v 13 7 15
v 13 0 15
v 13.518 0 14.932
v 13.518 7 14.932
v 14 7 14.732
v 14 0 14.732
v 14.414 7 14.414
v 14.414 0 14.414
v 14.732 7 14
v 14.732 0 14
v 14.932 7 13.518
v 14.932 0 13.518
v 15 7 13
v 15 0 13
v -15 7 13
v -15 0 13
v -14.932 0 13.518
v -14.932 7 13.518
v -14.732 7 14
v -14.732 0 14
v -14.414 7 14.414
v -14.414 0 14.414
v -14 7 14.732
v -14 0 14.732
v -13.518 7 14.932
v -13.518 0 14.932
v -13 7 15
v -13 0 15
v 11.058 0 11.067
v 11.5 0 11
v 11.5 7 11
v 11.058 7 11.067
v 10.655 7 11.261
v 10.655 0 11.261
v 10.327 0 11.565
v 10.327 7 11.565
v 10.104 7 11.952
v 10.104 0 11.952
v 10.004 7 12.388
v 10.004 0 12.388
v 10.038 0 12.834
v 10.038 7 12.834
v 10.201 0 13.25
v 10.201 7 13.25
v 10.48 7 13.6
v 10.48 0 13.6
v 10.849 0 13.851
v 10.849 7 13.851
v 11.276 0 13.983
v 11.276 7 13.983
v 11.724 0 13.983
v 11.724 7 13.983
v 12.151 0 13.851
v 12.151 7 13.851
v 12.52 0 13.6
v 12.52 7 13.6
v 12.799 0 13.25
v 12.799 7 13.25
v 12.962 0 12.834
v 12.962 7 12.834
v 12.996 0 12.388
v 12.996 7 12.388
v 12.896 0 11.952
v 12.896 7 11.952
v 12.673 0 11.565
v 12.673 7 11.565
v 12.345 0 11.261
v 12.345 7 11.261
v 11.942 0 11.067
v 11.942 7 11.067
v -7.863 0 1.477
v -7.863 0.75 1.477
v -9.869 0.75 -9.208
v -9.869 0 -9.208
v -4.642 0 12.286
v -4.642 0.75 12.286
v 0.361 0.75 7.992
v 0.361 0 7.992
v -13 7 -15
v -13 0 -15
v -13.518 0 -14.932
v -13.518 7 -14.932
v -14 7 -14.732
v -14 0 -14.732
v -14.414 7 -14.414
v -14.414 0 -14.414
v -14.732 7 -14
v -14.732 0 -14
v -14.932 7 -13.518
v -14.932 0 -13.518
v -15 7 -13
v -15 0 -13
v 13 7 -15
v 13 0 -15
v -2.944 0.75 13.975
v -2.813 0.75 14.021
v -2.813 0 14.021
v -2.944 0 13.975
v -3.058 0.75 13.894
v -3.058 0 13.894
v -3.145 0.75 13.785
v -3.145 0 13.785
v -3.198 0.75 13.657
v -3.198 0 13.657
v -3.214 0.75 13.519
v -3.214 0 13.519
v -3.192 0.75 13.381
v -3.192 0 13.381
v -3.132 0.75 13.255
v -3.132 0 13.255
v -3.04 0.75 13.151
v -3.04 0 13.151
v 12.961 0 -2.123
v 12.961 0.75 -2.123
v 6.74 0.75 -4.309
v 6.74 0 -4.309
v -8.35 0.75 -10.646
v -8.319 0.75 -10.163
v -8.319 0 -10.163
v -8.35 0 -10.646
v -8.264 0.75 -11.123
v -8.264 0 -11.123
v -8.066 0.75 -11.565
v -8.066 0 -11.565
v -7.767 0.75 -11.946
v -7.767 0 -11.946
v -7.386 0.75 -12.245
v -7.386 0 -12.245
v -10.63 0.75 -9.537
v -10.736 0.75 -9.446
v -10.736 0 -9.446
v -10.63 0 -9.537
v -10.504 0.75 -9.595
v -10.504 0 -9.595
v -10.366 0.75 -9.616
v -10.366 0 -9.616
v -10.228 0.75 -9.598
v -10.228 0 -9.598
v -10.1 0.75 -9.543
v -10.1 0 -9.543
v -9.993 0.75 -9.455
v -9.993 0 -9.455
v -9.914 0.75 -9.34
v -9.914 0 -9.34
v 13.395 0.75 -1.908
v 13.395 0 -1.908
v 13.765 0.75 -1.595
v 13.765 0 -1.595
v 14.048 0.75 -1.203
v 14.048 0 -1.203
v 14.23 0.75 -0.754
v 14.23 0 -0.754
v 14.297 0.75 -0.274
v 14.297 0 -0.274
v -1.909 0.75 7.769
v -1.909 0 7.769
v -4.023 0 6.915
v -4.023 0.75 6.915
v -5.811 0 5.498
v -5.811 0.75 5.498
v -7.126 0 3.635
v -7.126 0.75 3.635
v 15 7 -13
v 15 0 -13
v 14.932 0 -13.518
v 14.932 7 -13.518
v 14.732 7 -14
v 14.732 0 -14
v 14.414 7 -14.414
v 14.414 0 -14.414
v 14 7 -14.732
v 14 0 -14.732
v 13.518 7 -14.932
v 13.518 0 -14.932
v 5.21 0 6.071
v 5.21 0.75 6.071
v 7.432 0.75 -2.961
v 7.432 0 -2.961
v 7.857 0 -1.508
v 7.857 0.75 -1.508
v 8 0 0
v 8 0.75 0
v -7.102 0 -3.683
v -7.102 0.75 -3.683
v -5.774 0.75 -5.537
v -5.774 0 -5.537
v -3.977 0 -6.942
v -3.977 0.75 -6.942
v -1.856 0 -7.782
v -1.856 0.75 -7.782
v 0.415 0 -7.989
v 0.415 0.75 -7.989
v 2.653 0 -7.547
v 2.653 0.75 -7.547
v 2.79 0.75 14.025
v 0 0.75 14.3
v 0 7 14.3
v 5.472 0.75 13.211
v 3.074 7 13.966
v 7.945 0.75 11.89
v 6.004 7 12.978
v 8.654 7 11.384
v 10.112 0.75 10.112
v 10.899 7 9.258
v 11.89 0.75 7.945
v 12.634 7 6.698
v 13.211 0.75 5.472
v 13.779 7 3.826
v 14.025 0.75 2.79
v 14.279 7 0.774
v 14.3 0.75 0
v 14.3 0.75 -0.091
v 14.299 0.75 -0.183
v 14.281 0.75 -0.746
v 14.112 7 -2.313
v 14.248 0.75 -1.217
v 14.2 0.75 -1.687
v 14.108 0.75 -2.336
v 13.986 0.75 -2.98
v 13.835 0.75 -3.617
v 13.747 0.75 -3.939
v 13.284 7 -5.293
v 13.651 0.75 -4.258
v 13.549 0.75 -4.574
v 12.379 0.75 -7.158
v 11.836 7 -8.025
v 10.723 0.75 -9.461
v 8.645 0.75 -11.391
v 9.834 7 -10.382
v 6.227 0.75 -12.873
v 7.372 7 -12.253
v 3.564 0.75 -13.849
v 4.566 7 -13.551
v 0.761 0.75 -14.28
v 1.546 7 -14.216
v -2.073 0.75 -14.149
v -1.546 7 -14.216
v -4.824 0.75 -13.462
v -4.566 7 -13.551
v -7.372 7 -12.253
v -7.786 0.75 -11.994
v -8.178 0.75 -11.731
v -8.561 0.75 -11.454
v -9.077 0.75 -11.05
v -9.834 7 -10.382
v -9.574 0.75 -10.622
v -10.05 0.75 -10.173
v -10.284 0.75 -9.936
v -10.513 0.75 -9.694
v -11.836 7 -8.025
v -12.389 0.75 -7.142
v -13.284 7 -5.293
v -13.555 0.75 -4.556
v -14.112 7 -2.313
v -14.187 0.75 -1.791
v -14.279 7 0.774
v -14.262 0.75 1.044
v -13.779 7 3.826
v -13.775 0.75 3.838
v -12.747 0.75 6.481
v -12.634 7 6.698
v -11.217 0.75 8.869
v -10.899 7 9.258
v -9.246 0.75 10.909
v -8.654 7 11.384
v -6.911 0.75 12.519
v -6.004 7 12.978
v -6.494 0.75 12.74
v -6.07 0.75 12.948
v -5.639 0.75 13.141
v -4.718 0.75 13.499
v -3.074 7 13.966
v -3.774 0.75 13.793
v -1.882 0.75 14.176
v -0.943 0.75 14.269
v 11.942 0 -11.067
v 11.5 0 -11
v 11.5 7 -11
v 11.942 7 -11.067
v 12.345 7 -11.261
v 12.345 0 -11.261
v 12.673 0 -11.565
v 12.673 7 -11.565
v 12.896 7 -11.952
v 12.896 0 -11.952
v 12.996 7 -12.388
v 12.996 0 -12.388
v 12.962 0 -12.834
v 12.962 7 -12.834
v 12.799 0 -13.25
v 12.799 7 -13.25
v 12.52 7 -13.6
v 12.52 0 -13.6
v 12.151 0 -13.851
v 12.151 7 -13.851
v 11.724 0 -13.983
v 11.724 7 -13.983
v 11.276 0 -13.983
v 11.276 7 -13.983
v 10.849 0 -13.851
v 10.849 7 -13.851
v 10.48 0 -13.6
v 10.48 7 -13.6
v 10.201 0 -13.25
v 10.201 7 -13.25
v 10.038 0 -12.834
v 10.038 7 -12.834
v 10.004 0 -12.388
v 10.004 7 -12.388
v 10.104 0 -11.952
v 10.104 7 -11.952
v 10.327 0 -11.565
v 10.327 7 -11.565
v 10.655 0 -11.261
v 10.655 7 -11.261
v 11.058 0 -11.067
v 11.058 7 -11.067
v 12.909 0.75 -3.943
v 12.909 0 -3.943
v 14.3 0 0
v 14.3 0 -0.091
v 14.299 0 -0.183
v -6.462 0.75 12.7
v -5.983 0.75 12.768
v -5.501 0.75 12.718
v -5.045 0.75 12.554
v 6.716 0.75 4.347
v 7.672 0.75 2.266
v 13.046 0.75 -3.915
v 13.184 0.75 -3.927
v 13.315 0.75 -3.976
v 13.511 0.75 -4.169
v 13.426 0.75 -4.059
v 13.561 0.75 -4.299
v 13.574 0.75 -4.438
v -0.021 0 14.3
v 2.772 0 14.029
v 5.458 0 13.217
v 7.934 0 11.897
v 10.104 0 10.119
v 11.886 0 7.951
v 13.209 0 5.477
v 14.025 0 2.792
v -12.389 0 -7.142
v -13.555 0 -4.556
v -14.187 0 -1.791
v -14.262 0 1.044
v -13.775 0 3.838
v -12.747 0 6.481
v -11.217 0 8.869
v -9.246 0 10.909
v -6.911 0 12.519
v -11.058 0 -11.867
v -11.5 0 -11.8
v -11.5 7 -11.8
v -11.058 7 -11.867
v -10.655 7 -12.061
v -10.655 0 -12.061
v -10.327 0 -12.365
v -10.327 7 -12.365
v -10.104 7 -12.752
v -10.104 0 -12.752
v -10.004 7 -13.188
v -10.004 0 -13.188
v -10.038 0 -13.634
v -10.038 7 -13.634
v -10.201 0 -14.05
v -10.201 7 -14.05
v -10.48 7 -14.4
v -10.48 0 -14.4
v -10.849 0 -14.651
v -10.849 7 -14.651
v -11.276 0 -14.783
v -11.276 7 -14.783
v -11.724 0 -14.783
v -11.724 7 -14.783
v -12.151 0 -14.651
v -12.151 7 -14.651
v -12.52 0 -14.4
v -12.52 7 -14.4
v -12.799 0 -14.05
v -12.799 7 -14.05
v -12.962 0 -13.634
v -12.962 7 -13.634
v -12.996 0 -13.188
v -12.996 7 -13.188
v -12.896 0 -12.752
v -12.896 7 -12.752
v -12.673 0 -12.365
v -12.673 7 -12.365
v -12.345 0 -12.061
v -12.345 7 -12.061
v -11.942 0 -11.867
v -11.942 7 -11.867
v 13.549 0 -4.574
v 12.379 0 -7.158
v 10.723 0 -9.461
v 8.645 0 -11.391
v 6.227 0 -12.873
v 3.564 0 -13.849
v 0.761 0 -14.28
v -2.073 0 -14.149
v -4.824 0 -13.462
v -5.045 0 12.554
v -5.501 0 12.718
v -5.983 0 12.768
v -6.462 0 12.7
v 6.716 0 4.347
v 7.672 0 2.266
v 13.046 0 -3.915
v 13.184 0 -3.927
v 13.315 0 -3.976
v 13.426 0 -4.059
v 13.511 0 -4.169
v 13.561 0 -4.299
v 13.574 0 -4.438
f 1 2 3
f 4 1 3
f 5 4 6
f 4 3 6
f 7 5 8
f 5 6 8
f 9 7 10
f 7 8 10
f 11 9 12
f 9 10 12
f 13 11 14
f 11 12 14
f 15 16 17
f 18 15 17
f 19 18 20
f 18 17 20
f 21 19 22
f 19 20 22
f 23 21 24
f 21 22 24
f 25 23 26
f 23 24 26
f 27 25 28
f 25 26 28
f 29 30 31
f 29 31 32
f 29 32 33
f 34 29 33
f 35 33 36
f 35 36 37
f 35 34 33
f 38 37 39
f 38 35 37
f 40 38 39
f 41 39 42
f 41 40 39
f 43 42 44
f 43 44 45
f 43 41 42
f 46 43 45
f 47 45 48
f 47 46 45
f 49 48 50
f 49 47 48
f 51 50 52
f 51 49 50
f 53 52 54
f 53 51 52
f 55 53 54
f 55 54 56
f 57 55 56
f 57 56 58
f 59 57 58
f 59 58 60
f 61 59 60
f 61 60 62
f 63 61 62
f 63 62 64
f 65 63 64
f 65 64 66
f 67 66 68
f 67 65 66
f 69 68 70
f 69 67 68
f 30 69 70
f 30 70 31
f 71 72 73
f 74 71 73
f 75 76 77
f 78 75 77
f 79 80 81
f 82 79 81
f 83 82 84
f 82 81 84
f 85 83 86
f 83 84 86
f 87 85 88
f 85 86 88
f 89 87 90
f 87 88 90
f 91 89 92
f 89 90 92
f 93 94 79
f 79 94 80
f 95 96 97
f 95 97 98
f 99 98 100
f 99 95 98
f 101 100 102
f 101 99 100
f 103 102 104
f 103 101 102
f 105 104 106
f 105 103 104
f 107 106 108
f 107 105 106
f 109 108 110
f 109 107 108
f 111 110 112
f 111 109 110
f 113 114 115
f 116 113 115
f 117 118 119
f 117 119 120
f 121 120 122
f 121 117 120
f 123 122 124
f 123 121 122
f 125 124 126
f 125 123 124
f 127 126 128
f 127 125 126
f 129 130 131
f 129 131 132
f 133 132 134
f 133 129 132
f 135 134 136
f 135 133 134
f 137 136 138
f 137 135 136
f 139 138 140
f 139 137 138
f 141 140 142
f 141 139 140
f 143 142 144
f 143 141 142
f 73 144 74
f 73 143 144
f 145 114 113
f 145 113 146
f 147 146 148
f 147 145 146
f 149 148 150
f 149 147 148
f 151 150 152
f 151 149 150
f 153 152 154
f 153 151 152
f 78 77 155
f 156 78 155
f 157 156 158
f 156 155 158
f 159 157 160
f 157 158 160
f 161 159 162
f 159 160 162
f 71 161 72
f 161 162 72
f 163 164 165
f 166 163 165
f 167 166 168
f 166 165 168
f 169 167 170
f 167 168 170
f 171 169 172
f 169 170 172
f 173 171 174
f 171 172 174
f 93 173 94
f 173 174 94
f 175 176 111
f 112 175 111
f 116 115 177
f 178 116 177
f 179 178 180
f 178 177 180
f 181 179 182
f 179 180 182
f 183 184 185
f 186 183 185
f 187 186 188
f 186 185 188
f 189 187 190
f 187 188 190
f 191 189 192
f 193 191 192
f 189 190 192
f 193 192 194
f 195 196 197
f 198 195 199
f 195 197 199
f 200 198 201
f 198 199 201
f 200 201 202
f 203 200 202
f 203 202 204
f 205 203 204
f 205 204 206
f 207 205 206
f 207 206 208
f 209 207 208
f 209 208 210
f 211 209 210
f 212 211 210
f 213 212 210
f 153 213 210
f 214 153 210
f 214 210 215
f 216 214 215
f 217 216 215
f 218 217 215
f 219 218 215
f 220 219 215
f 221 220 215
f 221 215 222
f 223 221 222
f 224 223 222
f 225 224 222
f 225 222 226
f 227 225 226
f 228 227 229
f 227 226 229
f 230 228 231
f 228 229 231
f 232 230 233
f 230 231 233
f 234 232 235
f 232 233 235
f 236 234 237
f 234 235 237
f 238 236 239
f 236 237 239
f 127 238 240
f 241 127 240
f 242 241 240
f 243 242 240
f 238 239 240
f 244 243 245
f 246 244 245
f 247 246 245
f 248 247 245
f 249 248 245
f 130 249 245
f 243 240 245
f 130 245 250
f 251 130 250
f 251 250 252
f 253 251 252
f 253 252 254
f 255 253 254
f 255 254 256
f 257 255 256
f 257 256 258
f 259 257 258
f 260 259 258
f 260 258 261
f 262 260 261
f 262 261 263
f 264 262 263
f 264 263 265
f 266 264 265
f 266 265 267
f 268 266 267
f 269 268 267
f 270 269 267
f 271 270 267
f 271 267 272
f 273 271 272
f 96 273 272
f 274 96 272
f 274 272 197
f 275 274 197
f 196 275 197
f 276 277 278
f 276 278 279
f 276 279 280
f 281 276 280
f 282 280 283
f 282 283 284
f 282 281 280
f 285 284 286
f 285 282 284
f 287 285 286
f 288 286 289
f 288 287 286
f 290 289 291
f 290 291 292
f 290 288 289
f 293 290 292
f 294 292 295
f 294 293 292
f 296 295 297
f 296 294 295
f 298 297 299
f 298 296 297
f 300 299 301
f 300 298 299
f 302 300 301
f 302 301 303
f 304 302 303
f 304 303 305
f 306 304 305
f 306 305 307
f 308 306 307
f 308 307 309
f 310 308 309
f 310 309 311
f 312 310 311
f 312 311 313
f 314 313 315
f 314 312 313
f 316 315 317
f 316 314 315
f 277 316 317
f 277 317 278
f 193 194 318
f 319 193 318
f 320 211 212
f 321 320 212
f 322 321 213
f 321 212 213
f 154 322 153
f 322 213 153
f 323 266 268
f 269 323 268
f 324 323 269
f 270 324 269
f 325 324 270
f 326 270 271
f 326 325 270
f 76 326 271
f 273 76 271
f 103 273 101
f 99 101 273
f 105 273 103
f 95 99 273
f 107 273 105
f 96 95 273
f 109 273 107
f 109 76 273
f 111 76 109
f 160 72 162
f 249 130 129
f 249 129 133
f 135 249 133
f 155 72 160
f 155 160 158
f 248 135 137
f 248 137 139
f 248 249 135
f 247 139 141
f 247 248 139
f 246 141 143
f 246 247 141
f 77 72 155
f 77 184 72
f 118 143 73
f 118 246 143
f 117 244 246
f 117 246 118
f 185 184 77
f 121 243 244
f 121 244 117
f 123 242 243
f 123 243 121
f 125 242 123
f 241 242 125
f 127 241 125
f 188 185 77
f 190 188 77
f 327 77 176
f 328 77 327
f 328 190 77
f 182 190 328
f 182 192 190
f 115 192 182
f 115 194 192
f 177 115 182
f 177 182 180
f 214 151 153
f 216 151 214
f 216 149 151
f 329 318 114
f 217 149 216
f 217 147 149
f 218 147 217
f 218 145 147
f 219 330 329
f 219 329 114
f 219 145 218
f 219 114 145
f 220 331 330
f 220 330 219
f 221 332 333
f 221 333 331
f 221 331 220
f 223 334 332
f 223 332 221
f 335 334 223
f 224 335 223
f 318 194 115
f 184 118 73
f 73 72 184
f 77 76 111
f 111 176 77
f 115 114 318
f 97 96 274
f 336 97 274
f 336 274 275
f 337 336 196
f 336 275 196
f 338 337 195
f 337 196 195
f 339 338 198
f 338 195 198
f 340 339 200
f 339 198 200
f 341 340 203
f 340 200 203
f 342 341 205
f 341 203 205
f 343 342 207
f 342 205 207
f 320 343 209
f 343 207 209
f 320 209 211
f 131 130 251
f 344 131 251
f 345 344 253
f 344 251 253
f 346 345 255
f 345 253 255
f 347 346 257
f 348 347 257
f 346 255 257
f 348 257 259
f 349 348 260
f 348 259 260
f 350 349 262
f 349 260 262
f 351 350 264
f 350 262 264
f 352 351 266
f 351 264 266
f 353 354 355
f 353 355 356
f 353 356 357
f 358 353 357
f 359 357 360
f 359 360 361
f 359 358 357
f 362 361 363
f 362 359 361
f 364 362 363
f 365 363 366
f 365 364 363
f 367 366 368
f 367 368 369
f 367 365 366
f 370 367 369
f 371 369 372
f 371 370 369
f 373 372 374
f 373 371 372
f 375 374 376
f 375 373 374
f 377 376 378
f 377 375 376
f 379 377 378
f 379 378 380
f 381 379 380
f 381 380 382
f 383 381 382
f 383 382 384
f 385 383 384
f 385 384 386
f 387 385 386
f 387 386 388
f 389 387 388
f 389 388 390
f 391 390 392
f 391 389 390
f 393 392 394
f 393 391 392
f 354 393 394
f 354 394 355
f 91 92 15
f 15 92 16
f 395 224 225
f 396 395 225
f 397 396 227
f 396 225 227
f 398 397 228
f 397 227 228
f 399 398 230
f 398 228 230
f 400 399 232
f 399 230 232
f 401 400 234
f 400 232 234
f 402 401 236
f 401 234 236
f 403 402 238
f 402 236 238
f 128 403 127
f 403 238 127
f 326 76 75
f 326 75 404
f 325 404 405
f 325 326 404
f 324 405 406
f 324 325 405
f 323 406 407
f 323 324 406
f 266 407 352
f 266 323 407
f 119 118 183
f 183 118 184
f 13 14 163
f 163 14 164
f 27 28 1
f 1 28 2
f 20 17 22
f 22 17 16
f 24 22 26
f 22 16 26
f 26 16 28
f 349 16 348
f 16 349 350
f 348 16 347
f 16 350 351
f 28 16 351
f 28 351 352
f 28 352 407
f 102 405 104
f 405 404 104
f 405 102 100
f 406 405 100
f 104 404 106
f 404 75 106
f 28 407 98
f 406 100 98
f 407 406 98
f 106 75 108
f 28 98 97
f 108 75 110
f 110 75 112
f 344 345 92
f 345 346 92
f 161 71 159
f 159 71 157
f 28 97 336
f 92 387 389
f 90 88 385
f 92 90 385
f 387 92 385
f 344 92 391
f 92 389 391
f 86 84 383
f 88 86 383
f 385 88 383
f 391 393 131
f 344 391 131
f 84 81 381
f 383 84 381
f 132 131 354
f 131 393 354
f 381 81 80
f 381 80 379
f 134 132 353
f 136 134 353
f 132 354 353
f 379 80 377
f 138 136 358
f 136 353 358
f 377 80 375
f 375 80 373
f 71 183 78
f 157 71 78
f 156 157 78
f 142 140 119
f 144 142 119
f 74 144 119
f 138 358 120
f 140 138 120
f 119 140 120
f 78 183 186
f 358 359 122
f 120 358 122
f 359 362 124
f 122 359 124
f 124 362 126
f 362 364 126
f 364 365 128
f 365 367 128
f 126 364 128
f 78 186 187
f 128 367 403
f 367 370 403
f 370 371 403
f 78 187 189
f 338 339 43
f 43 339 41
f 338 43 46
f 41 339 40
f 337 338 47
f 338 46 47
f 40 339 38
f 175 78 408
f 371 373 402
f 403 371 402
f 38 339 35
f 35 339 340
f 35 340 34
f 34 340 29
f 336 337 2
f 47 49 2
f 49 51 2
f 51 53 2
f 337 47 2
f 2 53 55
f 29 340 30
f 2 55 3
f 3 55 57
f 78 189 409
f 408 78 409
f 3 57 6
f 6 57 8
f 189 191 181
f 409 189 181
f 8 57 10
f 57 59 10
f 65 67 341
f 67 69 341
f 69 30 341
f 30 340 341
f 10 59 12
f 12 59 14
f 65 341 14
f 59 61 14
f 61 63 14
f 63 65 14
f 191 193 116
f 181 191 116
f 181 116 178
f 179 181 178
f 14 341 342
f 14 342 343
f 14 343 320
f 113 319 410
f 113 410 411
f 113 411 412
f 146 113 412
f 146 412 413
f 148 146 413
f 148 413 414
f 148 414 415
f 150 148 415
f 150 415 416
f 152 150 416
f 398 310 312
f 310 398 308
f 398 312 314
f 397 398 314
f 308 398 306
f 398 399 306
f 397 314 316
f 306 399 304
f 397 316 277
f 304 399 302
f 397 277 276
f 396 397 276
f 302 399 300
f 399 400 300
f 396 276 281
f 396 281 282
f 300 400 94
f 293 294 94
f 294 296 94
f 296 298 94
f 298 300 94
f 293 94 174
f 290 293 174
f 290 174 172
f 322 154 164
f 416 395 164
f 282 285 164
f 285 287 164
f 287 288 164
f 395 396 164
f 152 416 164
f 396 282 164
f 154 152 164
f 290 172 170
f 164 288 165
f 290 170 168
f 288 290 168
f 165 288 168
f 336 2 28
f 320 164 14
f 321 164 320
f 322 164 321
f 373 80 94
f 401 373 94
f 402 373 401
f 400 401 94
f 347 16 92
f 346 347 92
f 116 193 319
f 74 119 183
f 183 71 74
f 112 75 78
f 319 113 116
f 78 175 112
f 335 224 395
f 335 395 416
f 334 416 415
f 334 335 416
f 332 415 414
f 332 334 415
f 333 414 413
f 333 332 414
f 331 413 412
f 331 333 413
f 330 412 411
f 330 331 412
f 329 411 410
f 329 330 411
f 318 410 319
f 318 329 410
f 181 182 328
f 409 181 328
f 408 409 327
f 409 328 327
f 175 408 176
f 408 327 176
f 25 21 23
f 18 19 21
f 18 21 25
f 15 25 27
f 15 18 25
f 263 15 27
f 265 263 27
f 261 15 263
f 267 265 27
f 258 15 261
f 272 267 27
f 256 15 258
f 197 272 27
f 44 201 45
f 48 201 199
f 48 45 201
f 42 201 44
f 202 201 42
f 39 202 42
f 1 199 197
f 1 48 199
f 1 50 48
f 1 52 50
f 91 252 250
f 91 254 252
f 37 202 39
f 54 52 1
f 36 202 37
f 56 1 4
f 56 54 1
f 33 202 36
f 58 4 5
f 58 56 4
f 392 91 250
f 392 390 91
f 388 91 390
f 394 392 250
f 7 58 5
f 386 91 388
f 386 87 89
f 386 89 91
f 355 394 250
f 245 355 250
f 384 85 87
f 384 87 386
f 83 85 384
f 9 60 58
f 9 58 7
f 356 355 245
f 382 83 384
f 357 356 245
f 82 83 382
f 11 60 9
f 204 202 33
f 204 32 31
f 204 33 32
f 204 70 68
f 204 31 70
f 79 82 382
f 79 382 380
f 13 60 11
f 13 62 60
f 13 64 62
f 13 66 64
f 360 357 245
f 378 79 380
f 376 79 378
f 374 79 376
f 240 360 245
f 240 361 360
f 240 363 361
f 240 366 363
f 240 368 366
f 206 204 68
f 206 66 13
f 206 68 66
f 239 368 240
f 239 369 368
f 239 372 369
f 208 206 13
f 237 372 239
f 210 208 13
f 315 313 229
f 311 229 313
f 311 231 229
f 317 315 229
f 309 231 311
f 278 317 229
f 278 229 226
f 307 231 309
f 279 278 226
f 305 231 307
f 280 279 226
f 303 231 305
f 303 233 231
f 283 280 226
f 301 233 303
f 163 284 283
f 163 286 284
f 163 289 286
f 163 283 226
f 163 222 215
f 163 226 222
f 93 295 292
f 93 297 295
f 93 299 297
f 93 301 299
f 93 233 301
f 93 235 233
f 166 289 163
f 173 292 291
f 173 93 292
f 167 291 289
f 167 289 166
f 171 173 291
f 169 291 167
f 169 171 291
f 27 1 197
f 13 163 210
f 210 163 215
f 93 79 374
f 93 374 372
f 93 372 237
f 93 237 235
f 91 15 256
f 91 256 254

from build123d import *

# Parameters (mm, degrees)
SKETCH1_R        = 1.5
MAINBLOCK_DEPTH  = 7
SKETCH2_R        = 14.3
ROTORSPACE_DEPTH = 6.25
MOTORBASE_DEPTH  = 0.75
FILLET1_R        = 2
FILLET2_R        = 0.5


with BuildPart() as part:
    # Sketch1 → MainBlock (new body)
    with BuildSketch(Plane(origin=(0, 0, 0), x_dir=(1, 0, 0), z_dir=(0, 1, 0))):
        with BuildLine():
            Line((-13, -15), (13, -15))
            ThreePointArc((13, -15), (14.414213562, -14.414213562), (15, -13))
            Line((15, -13), (15, 13))
            ThreePointArc((15, 13), (14.414213562, 14.414213562), (13, 15))
            Line((13, 15), (-13, 15))
            ThreePointArc((-13, 15), (-14.414213562, 14.414213562), (-15, 13))
            Line((-15, 13), (-15, -13))
            ThreePointArc((-15, -13), (-14.414213562, -14.414213562), (-13, -15))
        make_face()
        with Locations(Location((-11.5, 13.3, 0), (0, 0, 270))):
            Circle(SKETCH1_R, mode=Mode.SUBTRACT)
        with Locations(Location((11.5, 12.5, 0), (0, 0, 270))):
            Circle(SKETCH1_R, mode=Mode.SUBTRACT)
        with Locations(Location((11.5, -12.5, 0), (0, 0, 90))):
            Circle(SKETCH1_R, mode=Mode.SUBTRACT)
    extrude(amount=MAINBLOCK_DEPTH)

    # Sketch2 → RotorSpace (cut)
    with BuildSketch(Plane(origin=(0, 7, 0), x_dir=(1, 0, 0), z_dir=(0, 1, 0))):
        with Locations(Location((0, 0, 0), (0, 0, 270))):
            Circle(SKETCH2_R)
    extrude(amount=-ROTORSPACE_DEPTH, mode=Mode.SUBTRACT)

    # Sketch3 → MotorBase (cut)
    with BuildSketch(Plane(origin=(0, 0.75, 0), x_dir=(1, 0, 0), z_dir=(0, 1, 0))):
        with BuildLine():
            ThreePointArc((0.361277738, -7.991838236), (-4.967858622, -6.27059652), (-7.862560494, -1.476530557))
            Line((-7.862560494, -1.476530557), (-10.050196981, 10.172686009))
            ThreePointArc((-10.050196981, 10.172686009), (-14.050704626, -2.658514534), (-5.639005132, -13.141218403))
            Line((-5.639005132, -13.141218403), (0.361277738, -7.991838236))
        make_face()
        with BuildLine():
            ThreePointArc((-7.101773805, 3.683043419), (-2.946566572, 7.437590029), (2.652567275, 7.547442405))
            Line((2.652567275, 7.547442405), (13.834902999, 3.617382894))
            ThreePointArc((13.834902999, 3.617382894), (4.72301119, 13.497524414), (-8.561126408, 11.454130898))
            Line((-8.561126408, 11.454130898), (-7.101773805, 3.683043419))
        make_face()
        with BuildLine():
            Line((14.20013154, 1.687087505), (6.740496067, 4.308794817))
            ThreePointArc((6.740496067, 4.308794817), (7.678670736, 2.244552457), (8, 0))
            ThreePointArc((8, 0), (7.269110872, -3.340662678), (5.209993218, -6.070911848))
            Line((5.209993218, -6.070911848), (-3.784706018, -13.790068903))
            ThreePointArc((-3.784706018, -13.790068903), (8.670891071, -11.371264135), (14.3, 0))
            ThreePointArc((14.3, 0), (14.275011051, 0.845020408), (14.20013154, 1.687087505))
        make_face()
    extrude(amount=-MOTORBASE_DEPTH, mode=Mode.SUBTRACT)

    # Fillet1
    # the kernel refuses this fillet: 2 mm, written as the material it adds along each edge
    with BuildSketch(Plane(origin=(-8.561126408, 0.75, -11.454130898), x_dir=(0.18456631960106568, 0, 0.982820061694366), z_dir=(0, -1, 0)), Plane(origin=(14.20013154, 0.75, -1.687087505), x_dir=(-0.9434303005767882, 0, -0.33157090938981826), z_dir=(0, -1, 0))) as fillet1_piece_1:
        with BuildLine():
            CenterArc((1.313556996, -2), FILLET1_R, 90, 69.537546468)
            ThreePointArc((-0.560245969, -1.300813008), (-0.296237592, -0.643466118), (0, 0))
            Line((0, 0), (1.313556996, 0))
        make_face()
    extrude(amount=0.75)
    with BuildSketch(Plane(origin=(-5.639005132, 0.75, 13.141218403), x_dir=(-0.8983104632101903, 0, -0.43936125419419186), z_dir=(0, -1, 0))) as fillet1_piece_2:
        with BuildLine():
            CenterArc((1.317285733, 1.997546064), FILLET1_R, 203.301017311, 69.537546468)
            Line((-0.519592983, 1.206422444), (0, 0))
            ThreePointArc((0, 0), (0.708164887, -0.017545642), (1.416329774, 0))
        make_face()
    extrude(amount=0.75)

    # Fillet2
    # the kernel refuses this fillet: 0.5 mm, written as the material it adds along each edge
    with BuildSketch(Plane(origin=(13.834902999, 0.75, -3.617382894), x_dir=(-0.9434303005767886, 0, -0.33157090938981726), z_dir=(0, -1, 0)), Plane(origin=(-3.784706018, 0.75, 13.790068903), x_dir=(0.7588639809758072, 0, -0.6512491523046687), z_dir=(0, -1, 0)), Plane(origin=(-10.050196981, 0.75, -10.172686009), x_dir=(0.18456631960117675, 0, 0.982820061694345), z_dir=(0, -1, 0))) as fillet2_piece_1:
        with BuildLine():
            CenterArc((0.981325327, 0.5), FILLET2_R, 141.979598277, 128.020401723)
            ThreePointArc((0.587429586, 0.807971014), (0.286657409, 0.409116528), (0, 0))
            Line((0, 0), (0.981325327, 0))
        make_face()
    extrude(amount=0.75)


solid = part.part
